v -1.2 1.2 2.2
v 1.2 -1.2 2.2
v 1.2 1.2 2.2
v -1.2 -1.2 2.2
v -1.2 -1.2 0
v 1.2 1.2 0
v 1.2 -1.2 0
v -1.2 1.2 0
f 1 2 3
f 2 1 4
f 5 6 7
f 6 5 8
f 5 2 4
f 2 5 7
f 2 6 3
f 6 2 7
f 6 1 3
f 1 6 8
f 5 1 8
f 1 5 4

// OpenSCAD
// file: ../common/util.scad
// utility functions

module rotational_clone(clones=2) {
  for(i=[0:clones-1] ) {
    rotate([0,0,i * (360/clones)]) children();
  }
}
// file: ../settings.scad
/*
 *   Edit these settings to control the generated keycaps
 */

/* height of the part the finger rests on, doesn't exclude higher protrusions,
       eg. the saddle keycap rises on either side of the thumb for leverage */
effective_height=16+5;
//effective_height=11;

// maximum width in any direction, strict limit to prevent collision with adjacent keycaps
total_width=16;

// how thick the keycap, excluding the stem, should be. mostly aesthetic preference?
minimum_thickness = 1;


keycap_style = "trackpoint-lp";

/* can be auto (computationally expensive), manual (a bit janky, needs to be implemented for each keycap), or none.
     has no effect on certain keycaps such as trackpoint variants */
chamfer_style = "auto";

/* this allows you to rotate the keycap if the finger approaches at an angle
   you probably only want to rotate the Z-axis (third value) */
keycap_rotation = [0,0,0];


stem_model = "trackpoint-lp-clamp";


// "cr10 or "prusa" have presets, any other string will use a default tolerance, usually 0
printer = "prusa";

// slop factors for imprecision in the printing process
/*
vertical_slop = 0.1;
inner_slop = 0.4;
outer_slop = 0.2;
*/

/* -----------------------------------------------------------------------
 *  Do Not Edit - this machinery is consistent regardless of above values
 * -----------------------------------------------------------------------
 */

function auto_chamfer() = chamfer_style == "auto";

function manual_chamfer() = chamfer_style == "manual";
// file: trackpoint-lp.scad
/*
 *  A mount for a low profile Trackpoint rubber cap
 */

// ignores minimum_thickness, chamfer_style, etc so this isn't really needed atm
include <../settings.scad>;
use <../common/util.scad>

//$inner_slop_x = 0.0;
//$inner_slop_y = -0.0;
outer_slop = 0.1;
print_width = .4;
layer_height=.2;
first_layer=.2;

// it may vary somewhat, but the height of my rubber cap is 5mm
function height_offset() = 5;

side = 2.5;
raw_height=2.5;
function height(stem=true) = (stem?first_layer:0) + floor((raw_height-(stem?first_layer:0))/layer_height)*layer_height;

function adjusted_side_x(stem=true) = stem ? side + (is_undef($inner_slop_x) ? 0 : $inner_slop_x) : side - outer_slop;
function adjusted_side_y(stem=true) = stem ? side + (is_undef($inner_slop_y) ? 0 : $inner_slop_y) : side - outer_slop;
// this alias is for using when making a hole for a stem
module cap_tplp(stem=true) {
  //adjusted_side = adjusted_side();
  adjusted_height = height(stem) + (stem?0*layer_height:-layer_height);

  translate([0,0,adjusted_height/2]) cube([adjusted_side_x(stem=stem),adjusted_side_y(stem=stem),adjusted_height],true);
  if(stem) {
    let(inside=.2,outside=print_width,s=inside+outside) {
      translate([adjusted_side_x(stem=stem)/2-inside,adjusted_side_y(stem=stem)/2-inside,0]) cube([s,s,adjusted_height]);
      translate([-adjusted_side_x(stem=stem)/2-outside,-adjusted_side_y(stem=stem)/2-outside,0]) cube([s,s,adjusted_height]);
      translate([adjusted_side_x(stem=stem)/2-inside,-adjusted_side_y(stem=stem)/2-outside,0]) cube([s,s,adjusted_height]);
      translate([-adjusted_side_x(stem=stem)/2-outside,adjusted_side_y(stem=stem)/2-inside,0]) cube([s,s,adjusted_height]);
    }
  }
}

// this is for using as a cap
module cap() {
  cap_tplp(stem=false);
}

cap($fn=12);
// main file
include <trackpoint-lp.scad>

// Super Low Profile
function height_offset() = 4;
